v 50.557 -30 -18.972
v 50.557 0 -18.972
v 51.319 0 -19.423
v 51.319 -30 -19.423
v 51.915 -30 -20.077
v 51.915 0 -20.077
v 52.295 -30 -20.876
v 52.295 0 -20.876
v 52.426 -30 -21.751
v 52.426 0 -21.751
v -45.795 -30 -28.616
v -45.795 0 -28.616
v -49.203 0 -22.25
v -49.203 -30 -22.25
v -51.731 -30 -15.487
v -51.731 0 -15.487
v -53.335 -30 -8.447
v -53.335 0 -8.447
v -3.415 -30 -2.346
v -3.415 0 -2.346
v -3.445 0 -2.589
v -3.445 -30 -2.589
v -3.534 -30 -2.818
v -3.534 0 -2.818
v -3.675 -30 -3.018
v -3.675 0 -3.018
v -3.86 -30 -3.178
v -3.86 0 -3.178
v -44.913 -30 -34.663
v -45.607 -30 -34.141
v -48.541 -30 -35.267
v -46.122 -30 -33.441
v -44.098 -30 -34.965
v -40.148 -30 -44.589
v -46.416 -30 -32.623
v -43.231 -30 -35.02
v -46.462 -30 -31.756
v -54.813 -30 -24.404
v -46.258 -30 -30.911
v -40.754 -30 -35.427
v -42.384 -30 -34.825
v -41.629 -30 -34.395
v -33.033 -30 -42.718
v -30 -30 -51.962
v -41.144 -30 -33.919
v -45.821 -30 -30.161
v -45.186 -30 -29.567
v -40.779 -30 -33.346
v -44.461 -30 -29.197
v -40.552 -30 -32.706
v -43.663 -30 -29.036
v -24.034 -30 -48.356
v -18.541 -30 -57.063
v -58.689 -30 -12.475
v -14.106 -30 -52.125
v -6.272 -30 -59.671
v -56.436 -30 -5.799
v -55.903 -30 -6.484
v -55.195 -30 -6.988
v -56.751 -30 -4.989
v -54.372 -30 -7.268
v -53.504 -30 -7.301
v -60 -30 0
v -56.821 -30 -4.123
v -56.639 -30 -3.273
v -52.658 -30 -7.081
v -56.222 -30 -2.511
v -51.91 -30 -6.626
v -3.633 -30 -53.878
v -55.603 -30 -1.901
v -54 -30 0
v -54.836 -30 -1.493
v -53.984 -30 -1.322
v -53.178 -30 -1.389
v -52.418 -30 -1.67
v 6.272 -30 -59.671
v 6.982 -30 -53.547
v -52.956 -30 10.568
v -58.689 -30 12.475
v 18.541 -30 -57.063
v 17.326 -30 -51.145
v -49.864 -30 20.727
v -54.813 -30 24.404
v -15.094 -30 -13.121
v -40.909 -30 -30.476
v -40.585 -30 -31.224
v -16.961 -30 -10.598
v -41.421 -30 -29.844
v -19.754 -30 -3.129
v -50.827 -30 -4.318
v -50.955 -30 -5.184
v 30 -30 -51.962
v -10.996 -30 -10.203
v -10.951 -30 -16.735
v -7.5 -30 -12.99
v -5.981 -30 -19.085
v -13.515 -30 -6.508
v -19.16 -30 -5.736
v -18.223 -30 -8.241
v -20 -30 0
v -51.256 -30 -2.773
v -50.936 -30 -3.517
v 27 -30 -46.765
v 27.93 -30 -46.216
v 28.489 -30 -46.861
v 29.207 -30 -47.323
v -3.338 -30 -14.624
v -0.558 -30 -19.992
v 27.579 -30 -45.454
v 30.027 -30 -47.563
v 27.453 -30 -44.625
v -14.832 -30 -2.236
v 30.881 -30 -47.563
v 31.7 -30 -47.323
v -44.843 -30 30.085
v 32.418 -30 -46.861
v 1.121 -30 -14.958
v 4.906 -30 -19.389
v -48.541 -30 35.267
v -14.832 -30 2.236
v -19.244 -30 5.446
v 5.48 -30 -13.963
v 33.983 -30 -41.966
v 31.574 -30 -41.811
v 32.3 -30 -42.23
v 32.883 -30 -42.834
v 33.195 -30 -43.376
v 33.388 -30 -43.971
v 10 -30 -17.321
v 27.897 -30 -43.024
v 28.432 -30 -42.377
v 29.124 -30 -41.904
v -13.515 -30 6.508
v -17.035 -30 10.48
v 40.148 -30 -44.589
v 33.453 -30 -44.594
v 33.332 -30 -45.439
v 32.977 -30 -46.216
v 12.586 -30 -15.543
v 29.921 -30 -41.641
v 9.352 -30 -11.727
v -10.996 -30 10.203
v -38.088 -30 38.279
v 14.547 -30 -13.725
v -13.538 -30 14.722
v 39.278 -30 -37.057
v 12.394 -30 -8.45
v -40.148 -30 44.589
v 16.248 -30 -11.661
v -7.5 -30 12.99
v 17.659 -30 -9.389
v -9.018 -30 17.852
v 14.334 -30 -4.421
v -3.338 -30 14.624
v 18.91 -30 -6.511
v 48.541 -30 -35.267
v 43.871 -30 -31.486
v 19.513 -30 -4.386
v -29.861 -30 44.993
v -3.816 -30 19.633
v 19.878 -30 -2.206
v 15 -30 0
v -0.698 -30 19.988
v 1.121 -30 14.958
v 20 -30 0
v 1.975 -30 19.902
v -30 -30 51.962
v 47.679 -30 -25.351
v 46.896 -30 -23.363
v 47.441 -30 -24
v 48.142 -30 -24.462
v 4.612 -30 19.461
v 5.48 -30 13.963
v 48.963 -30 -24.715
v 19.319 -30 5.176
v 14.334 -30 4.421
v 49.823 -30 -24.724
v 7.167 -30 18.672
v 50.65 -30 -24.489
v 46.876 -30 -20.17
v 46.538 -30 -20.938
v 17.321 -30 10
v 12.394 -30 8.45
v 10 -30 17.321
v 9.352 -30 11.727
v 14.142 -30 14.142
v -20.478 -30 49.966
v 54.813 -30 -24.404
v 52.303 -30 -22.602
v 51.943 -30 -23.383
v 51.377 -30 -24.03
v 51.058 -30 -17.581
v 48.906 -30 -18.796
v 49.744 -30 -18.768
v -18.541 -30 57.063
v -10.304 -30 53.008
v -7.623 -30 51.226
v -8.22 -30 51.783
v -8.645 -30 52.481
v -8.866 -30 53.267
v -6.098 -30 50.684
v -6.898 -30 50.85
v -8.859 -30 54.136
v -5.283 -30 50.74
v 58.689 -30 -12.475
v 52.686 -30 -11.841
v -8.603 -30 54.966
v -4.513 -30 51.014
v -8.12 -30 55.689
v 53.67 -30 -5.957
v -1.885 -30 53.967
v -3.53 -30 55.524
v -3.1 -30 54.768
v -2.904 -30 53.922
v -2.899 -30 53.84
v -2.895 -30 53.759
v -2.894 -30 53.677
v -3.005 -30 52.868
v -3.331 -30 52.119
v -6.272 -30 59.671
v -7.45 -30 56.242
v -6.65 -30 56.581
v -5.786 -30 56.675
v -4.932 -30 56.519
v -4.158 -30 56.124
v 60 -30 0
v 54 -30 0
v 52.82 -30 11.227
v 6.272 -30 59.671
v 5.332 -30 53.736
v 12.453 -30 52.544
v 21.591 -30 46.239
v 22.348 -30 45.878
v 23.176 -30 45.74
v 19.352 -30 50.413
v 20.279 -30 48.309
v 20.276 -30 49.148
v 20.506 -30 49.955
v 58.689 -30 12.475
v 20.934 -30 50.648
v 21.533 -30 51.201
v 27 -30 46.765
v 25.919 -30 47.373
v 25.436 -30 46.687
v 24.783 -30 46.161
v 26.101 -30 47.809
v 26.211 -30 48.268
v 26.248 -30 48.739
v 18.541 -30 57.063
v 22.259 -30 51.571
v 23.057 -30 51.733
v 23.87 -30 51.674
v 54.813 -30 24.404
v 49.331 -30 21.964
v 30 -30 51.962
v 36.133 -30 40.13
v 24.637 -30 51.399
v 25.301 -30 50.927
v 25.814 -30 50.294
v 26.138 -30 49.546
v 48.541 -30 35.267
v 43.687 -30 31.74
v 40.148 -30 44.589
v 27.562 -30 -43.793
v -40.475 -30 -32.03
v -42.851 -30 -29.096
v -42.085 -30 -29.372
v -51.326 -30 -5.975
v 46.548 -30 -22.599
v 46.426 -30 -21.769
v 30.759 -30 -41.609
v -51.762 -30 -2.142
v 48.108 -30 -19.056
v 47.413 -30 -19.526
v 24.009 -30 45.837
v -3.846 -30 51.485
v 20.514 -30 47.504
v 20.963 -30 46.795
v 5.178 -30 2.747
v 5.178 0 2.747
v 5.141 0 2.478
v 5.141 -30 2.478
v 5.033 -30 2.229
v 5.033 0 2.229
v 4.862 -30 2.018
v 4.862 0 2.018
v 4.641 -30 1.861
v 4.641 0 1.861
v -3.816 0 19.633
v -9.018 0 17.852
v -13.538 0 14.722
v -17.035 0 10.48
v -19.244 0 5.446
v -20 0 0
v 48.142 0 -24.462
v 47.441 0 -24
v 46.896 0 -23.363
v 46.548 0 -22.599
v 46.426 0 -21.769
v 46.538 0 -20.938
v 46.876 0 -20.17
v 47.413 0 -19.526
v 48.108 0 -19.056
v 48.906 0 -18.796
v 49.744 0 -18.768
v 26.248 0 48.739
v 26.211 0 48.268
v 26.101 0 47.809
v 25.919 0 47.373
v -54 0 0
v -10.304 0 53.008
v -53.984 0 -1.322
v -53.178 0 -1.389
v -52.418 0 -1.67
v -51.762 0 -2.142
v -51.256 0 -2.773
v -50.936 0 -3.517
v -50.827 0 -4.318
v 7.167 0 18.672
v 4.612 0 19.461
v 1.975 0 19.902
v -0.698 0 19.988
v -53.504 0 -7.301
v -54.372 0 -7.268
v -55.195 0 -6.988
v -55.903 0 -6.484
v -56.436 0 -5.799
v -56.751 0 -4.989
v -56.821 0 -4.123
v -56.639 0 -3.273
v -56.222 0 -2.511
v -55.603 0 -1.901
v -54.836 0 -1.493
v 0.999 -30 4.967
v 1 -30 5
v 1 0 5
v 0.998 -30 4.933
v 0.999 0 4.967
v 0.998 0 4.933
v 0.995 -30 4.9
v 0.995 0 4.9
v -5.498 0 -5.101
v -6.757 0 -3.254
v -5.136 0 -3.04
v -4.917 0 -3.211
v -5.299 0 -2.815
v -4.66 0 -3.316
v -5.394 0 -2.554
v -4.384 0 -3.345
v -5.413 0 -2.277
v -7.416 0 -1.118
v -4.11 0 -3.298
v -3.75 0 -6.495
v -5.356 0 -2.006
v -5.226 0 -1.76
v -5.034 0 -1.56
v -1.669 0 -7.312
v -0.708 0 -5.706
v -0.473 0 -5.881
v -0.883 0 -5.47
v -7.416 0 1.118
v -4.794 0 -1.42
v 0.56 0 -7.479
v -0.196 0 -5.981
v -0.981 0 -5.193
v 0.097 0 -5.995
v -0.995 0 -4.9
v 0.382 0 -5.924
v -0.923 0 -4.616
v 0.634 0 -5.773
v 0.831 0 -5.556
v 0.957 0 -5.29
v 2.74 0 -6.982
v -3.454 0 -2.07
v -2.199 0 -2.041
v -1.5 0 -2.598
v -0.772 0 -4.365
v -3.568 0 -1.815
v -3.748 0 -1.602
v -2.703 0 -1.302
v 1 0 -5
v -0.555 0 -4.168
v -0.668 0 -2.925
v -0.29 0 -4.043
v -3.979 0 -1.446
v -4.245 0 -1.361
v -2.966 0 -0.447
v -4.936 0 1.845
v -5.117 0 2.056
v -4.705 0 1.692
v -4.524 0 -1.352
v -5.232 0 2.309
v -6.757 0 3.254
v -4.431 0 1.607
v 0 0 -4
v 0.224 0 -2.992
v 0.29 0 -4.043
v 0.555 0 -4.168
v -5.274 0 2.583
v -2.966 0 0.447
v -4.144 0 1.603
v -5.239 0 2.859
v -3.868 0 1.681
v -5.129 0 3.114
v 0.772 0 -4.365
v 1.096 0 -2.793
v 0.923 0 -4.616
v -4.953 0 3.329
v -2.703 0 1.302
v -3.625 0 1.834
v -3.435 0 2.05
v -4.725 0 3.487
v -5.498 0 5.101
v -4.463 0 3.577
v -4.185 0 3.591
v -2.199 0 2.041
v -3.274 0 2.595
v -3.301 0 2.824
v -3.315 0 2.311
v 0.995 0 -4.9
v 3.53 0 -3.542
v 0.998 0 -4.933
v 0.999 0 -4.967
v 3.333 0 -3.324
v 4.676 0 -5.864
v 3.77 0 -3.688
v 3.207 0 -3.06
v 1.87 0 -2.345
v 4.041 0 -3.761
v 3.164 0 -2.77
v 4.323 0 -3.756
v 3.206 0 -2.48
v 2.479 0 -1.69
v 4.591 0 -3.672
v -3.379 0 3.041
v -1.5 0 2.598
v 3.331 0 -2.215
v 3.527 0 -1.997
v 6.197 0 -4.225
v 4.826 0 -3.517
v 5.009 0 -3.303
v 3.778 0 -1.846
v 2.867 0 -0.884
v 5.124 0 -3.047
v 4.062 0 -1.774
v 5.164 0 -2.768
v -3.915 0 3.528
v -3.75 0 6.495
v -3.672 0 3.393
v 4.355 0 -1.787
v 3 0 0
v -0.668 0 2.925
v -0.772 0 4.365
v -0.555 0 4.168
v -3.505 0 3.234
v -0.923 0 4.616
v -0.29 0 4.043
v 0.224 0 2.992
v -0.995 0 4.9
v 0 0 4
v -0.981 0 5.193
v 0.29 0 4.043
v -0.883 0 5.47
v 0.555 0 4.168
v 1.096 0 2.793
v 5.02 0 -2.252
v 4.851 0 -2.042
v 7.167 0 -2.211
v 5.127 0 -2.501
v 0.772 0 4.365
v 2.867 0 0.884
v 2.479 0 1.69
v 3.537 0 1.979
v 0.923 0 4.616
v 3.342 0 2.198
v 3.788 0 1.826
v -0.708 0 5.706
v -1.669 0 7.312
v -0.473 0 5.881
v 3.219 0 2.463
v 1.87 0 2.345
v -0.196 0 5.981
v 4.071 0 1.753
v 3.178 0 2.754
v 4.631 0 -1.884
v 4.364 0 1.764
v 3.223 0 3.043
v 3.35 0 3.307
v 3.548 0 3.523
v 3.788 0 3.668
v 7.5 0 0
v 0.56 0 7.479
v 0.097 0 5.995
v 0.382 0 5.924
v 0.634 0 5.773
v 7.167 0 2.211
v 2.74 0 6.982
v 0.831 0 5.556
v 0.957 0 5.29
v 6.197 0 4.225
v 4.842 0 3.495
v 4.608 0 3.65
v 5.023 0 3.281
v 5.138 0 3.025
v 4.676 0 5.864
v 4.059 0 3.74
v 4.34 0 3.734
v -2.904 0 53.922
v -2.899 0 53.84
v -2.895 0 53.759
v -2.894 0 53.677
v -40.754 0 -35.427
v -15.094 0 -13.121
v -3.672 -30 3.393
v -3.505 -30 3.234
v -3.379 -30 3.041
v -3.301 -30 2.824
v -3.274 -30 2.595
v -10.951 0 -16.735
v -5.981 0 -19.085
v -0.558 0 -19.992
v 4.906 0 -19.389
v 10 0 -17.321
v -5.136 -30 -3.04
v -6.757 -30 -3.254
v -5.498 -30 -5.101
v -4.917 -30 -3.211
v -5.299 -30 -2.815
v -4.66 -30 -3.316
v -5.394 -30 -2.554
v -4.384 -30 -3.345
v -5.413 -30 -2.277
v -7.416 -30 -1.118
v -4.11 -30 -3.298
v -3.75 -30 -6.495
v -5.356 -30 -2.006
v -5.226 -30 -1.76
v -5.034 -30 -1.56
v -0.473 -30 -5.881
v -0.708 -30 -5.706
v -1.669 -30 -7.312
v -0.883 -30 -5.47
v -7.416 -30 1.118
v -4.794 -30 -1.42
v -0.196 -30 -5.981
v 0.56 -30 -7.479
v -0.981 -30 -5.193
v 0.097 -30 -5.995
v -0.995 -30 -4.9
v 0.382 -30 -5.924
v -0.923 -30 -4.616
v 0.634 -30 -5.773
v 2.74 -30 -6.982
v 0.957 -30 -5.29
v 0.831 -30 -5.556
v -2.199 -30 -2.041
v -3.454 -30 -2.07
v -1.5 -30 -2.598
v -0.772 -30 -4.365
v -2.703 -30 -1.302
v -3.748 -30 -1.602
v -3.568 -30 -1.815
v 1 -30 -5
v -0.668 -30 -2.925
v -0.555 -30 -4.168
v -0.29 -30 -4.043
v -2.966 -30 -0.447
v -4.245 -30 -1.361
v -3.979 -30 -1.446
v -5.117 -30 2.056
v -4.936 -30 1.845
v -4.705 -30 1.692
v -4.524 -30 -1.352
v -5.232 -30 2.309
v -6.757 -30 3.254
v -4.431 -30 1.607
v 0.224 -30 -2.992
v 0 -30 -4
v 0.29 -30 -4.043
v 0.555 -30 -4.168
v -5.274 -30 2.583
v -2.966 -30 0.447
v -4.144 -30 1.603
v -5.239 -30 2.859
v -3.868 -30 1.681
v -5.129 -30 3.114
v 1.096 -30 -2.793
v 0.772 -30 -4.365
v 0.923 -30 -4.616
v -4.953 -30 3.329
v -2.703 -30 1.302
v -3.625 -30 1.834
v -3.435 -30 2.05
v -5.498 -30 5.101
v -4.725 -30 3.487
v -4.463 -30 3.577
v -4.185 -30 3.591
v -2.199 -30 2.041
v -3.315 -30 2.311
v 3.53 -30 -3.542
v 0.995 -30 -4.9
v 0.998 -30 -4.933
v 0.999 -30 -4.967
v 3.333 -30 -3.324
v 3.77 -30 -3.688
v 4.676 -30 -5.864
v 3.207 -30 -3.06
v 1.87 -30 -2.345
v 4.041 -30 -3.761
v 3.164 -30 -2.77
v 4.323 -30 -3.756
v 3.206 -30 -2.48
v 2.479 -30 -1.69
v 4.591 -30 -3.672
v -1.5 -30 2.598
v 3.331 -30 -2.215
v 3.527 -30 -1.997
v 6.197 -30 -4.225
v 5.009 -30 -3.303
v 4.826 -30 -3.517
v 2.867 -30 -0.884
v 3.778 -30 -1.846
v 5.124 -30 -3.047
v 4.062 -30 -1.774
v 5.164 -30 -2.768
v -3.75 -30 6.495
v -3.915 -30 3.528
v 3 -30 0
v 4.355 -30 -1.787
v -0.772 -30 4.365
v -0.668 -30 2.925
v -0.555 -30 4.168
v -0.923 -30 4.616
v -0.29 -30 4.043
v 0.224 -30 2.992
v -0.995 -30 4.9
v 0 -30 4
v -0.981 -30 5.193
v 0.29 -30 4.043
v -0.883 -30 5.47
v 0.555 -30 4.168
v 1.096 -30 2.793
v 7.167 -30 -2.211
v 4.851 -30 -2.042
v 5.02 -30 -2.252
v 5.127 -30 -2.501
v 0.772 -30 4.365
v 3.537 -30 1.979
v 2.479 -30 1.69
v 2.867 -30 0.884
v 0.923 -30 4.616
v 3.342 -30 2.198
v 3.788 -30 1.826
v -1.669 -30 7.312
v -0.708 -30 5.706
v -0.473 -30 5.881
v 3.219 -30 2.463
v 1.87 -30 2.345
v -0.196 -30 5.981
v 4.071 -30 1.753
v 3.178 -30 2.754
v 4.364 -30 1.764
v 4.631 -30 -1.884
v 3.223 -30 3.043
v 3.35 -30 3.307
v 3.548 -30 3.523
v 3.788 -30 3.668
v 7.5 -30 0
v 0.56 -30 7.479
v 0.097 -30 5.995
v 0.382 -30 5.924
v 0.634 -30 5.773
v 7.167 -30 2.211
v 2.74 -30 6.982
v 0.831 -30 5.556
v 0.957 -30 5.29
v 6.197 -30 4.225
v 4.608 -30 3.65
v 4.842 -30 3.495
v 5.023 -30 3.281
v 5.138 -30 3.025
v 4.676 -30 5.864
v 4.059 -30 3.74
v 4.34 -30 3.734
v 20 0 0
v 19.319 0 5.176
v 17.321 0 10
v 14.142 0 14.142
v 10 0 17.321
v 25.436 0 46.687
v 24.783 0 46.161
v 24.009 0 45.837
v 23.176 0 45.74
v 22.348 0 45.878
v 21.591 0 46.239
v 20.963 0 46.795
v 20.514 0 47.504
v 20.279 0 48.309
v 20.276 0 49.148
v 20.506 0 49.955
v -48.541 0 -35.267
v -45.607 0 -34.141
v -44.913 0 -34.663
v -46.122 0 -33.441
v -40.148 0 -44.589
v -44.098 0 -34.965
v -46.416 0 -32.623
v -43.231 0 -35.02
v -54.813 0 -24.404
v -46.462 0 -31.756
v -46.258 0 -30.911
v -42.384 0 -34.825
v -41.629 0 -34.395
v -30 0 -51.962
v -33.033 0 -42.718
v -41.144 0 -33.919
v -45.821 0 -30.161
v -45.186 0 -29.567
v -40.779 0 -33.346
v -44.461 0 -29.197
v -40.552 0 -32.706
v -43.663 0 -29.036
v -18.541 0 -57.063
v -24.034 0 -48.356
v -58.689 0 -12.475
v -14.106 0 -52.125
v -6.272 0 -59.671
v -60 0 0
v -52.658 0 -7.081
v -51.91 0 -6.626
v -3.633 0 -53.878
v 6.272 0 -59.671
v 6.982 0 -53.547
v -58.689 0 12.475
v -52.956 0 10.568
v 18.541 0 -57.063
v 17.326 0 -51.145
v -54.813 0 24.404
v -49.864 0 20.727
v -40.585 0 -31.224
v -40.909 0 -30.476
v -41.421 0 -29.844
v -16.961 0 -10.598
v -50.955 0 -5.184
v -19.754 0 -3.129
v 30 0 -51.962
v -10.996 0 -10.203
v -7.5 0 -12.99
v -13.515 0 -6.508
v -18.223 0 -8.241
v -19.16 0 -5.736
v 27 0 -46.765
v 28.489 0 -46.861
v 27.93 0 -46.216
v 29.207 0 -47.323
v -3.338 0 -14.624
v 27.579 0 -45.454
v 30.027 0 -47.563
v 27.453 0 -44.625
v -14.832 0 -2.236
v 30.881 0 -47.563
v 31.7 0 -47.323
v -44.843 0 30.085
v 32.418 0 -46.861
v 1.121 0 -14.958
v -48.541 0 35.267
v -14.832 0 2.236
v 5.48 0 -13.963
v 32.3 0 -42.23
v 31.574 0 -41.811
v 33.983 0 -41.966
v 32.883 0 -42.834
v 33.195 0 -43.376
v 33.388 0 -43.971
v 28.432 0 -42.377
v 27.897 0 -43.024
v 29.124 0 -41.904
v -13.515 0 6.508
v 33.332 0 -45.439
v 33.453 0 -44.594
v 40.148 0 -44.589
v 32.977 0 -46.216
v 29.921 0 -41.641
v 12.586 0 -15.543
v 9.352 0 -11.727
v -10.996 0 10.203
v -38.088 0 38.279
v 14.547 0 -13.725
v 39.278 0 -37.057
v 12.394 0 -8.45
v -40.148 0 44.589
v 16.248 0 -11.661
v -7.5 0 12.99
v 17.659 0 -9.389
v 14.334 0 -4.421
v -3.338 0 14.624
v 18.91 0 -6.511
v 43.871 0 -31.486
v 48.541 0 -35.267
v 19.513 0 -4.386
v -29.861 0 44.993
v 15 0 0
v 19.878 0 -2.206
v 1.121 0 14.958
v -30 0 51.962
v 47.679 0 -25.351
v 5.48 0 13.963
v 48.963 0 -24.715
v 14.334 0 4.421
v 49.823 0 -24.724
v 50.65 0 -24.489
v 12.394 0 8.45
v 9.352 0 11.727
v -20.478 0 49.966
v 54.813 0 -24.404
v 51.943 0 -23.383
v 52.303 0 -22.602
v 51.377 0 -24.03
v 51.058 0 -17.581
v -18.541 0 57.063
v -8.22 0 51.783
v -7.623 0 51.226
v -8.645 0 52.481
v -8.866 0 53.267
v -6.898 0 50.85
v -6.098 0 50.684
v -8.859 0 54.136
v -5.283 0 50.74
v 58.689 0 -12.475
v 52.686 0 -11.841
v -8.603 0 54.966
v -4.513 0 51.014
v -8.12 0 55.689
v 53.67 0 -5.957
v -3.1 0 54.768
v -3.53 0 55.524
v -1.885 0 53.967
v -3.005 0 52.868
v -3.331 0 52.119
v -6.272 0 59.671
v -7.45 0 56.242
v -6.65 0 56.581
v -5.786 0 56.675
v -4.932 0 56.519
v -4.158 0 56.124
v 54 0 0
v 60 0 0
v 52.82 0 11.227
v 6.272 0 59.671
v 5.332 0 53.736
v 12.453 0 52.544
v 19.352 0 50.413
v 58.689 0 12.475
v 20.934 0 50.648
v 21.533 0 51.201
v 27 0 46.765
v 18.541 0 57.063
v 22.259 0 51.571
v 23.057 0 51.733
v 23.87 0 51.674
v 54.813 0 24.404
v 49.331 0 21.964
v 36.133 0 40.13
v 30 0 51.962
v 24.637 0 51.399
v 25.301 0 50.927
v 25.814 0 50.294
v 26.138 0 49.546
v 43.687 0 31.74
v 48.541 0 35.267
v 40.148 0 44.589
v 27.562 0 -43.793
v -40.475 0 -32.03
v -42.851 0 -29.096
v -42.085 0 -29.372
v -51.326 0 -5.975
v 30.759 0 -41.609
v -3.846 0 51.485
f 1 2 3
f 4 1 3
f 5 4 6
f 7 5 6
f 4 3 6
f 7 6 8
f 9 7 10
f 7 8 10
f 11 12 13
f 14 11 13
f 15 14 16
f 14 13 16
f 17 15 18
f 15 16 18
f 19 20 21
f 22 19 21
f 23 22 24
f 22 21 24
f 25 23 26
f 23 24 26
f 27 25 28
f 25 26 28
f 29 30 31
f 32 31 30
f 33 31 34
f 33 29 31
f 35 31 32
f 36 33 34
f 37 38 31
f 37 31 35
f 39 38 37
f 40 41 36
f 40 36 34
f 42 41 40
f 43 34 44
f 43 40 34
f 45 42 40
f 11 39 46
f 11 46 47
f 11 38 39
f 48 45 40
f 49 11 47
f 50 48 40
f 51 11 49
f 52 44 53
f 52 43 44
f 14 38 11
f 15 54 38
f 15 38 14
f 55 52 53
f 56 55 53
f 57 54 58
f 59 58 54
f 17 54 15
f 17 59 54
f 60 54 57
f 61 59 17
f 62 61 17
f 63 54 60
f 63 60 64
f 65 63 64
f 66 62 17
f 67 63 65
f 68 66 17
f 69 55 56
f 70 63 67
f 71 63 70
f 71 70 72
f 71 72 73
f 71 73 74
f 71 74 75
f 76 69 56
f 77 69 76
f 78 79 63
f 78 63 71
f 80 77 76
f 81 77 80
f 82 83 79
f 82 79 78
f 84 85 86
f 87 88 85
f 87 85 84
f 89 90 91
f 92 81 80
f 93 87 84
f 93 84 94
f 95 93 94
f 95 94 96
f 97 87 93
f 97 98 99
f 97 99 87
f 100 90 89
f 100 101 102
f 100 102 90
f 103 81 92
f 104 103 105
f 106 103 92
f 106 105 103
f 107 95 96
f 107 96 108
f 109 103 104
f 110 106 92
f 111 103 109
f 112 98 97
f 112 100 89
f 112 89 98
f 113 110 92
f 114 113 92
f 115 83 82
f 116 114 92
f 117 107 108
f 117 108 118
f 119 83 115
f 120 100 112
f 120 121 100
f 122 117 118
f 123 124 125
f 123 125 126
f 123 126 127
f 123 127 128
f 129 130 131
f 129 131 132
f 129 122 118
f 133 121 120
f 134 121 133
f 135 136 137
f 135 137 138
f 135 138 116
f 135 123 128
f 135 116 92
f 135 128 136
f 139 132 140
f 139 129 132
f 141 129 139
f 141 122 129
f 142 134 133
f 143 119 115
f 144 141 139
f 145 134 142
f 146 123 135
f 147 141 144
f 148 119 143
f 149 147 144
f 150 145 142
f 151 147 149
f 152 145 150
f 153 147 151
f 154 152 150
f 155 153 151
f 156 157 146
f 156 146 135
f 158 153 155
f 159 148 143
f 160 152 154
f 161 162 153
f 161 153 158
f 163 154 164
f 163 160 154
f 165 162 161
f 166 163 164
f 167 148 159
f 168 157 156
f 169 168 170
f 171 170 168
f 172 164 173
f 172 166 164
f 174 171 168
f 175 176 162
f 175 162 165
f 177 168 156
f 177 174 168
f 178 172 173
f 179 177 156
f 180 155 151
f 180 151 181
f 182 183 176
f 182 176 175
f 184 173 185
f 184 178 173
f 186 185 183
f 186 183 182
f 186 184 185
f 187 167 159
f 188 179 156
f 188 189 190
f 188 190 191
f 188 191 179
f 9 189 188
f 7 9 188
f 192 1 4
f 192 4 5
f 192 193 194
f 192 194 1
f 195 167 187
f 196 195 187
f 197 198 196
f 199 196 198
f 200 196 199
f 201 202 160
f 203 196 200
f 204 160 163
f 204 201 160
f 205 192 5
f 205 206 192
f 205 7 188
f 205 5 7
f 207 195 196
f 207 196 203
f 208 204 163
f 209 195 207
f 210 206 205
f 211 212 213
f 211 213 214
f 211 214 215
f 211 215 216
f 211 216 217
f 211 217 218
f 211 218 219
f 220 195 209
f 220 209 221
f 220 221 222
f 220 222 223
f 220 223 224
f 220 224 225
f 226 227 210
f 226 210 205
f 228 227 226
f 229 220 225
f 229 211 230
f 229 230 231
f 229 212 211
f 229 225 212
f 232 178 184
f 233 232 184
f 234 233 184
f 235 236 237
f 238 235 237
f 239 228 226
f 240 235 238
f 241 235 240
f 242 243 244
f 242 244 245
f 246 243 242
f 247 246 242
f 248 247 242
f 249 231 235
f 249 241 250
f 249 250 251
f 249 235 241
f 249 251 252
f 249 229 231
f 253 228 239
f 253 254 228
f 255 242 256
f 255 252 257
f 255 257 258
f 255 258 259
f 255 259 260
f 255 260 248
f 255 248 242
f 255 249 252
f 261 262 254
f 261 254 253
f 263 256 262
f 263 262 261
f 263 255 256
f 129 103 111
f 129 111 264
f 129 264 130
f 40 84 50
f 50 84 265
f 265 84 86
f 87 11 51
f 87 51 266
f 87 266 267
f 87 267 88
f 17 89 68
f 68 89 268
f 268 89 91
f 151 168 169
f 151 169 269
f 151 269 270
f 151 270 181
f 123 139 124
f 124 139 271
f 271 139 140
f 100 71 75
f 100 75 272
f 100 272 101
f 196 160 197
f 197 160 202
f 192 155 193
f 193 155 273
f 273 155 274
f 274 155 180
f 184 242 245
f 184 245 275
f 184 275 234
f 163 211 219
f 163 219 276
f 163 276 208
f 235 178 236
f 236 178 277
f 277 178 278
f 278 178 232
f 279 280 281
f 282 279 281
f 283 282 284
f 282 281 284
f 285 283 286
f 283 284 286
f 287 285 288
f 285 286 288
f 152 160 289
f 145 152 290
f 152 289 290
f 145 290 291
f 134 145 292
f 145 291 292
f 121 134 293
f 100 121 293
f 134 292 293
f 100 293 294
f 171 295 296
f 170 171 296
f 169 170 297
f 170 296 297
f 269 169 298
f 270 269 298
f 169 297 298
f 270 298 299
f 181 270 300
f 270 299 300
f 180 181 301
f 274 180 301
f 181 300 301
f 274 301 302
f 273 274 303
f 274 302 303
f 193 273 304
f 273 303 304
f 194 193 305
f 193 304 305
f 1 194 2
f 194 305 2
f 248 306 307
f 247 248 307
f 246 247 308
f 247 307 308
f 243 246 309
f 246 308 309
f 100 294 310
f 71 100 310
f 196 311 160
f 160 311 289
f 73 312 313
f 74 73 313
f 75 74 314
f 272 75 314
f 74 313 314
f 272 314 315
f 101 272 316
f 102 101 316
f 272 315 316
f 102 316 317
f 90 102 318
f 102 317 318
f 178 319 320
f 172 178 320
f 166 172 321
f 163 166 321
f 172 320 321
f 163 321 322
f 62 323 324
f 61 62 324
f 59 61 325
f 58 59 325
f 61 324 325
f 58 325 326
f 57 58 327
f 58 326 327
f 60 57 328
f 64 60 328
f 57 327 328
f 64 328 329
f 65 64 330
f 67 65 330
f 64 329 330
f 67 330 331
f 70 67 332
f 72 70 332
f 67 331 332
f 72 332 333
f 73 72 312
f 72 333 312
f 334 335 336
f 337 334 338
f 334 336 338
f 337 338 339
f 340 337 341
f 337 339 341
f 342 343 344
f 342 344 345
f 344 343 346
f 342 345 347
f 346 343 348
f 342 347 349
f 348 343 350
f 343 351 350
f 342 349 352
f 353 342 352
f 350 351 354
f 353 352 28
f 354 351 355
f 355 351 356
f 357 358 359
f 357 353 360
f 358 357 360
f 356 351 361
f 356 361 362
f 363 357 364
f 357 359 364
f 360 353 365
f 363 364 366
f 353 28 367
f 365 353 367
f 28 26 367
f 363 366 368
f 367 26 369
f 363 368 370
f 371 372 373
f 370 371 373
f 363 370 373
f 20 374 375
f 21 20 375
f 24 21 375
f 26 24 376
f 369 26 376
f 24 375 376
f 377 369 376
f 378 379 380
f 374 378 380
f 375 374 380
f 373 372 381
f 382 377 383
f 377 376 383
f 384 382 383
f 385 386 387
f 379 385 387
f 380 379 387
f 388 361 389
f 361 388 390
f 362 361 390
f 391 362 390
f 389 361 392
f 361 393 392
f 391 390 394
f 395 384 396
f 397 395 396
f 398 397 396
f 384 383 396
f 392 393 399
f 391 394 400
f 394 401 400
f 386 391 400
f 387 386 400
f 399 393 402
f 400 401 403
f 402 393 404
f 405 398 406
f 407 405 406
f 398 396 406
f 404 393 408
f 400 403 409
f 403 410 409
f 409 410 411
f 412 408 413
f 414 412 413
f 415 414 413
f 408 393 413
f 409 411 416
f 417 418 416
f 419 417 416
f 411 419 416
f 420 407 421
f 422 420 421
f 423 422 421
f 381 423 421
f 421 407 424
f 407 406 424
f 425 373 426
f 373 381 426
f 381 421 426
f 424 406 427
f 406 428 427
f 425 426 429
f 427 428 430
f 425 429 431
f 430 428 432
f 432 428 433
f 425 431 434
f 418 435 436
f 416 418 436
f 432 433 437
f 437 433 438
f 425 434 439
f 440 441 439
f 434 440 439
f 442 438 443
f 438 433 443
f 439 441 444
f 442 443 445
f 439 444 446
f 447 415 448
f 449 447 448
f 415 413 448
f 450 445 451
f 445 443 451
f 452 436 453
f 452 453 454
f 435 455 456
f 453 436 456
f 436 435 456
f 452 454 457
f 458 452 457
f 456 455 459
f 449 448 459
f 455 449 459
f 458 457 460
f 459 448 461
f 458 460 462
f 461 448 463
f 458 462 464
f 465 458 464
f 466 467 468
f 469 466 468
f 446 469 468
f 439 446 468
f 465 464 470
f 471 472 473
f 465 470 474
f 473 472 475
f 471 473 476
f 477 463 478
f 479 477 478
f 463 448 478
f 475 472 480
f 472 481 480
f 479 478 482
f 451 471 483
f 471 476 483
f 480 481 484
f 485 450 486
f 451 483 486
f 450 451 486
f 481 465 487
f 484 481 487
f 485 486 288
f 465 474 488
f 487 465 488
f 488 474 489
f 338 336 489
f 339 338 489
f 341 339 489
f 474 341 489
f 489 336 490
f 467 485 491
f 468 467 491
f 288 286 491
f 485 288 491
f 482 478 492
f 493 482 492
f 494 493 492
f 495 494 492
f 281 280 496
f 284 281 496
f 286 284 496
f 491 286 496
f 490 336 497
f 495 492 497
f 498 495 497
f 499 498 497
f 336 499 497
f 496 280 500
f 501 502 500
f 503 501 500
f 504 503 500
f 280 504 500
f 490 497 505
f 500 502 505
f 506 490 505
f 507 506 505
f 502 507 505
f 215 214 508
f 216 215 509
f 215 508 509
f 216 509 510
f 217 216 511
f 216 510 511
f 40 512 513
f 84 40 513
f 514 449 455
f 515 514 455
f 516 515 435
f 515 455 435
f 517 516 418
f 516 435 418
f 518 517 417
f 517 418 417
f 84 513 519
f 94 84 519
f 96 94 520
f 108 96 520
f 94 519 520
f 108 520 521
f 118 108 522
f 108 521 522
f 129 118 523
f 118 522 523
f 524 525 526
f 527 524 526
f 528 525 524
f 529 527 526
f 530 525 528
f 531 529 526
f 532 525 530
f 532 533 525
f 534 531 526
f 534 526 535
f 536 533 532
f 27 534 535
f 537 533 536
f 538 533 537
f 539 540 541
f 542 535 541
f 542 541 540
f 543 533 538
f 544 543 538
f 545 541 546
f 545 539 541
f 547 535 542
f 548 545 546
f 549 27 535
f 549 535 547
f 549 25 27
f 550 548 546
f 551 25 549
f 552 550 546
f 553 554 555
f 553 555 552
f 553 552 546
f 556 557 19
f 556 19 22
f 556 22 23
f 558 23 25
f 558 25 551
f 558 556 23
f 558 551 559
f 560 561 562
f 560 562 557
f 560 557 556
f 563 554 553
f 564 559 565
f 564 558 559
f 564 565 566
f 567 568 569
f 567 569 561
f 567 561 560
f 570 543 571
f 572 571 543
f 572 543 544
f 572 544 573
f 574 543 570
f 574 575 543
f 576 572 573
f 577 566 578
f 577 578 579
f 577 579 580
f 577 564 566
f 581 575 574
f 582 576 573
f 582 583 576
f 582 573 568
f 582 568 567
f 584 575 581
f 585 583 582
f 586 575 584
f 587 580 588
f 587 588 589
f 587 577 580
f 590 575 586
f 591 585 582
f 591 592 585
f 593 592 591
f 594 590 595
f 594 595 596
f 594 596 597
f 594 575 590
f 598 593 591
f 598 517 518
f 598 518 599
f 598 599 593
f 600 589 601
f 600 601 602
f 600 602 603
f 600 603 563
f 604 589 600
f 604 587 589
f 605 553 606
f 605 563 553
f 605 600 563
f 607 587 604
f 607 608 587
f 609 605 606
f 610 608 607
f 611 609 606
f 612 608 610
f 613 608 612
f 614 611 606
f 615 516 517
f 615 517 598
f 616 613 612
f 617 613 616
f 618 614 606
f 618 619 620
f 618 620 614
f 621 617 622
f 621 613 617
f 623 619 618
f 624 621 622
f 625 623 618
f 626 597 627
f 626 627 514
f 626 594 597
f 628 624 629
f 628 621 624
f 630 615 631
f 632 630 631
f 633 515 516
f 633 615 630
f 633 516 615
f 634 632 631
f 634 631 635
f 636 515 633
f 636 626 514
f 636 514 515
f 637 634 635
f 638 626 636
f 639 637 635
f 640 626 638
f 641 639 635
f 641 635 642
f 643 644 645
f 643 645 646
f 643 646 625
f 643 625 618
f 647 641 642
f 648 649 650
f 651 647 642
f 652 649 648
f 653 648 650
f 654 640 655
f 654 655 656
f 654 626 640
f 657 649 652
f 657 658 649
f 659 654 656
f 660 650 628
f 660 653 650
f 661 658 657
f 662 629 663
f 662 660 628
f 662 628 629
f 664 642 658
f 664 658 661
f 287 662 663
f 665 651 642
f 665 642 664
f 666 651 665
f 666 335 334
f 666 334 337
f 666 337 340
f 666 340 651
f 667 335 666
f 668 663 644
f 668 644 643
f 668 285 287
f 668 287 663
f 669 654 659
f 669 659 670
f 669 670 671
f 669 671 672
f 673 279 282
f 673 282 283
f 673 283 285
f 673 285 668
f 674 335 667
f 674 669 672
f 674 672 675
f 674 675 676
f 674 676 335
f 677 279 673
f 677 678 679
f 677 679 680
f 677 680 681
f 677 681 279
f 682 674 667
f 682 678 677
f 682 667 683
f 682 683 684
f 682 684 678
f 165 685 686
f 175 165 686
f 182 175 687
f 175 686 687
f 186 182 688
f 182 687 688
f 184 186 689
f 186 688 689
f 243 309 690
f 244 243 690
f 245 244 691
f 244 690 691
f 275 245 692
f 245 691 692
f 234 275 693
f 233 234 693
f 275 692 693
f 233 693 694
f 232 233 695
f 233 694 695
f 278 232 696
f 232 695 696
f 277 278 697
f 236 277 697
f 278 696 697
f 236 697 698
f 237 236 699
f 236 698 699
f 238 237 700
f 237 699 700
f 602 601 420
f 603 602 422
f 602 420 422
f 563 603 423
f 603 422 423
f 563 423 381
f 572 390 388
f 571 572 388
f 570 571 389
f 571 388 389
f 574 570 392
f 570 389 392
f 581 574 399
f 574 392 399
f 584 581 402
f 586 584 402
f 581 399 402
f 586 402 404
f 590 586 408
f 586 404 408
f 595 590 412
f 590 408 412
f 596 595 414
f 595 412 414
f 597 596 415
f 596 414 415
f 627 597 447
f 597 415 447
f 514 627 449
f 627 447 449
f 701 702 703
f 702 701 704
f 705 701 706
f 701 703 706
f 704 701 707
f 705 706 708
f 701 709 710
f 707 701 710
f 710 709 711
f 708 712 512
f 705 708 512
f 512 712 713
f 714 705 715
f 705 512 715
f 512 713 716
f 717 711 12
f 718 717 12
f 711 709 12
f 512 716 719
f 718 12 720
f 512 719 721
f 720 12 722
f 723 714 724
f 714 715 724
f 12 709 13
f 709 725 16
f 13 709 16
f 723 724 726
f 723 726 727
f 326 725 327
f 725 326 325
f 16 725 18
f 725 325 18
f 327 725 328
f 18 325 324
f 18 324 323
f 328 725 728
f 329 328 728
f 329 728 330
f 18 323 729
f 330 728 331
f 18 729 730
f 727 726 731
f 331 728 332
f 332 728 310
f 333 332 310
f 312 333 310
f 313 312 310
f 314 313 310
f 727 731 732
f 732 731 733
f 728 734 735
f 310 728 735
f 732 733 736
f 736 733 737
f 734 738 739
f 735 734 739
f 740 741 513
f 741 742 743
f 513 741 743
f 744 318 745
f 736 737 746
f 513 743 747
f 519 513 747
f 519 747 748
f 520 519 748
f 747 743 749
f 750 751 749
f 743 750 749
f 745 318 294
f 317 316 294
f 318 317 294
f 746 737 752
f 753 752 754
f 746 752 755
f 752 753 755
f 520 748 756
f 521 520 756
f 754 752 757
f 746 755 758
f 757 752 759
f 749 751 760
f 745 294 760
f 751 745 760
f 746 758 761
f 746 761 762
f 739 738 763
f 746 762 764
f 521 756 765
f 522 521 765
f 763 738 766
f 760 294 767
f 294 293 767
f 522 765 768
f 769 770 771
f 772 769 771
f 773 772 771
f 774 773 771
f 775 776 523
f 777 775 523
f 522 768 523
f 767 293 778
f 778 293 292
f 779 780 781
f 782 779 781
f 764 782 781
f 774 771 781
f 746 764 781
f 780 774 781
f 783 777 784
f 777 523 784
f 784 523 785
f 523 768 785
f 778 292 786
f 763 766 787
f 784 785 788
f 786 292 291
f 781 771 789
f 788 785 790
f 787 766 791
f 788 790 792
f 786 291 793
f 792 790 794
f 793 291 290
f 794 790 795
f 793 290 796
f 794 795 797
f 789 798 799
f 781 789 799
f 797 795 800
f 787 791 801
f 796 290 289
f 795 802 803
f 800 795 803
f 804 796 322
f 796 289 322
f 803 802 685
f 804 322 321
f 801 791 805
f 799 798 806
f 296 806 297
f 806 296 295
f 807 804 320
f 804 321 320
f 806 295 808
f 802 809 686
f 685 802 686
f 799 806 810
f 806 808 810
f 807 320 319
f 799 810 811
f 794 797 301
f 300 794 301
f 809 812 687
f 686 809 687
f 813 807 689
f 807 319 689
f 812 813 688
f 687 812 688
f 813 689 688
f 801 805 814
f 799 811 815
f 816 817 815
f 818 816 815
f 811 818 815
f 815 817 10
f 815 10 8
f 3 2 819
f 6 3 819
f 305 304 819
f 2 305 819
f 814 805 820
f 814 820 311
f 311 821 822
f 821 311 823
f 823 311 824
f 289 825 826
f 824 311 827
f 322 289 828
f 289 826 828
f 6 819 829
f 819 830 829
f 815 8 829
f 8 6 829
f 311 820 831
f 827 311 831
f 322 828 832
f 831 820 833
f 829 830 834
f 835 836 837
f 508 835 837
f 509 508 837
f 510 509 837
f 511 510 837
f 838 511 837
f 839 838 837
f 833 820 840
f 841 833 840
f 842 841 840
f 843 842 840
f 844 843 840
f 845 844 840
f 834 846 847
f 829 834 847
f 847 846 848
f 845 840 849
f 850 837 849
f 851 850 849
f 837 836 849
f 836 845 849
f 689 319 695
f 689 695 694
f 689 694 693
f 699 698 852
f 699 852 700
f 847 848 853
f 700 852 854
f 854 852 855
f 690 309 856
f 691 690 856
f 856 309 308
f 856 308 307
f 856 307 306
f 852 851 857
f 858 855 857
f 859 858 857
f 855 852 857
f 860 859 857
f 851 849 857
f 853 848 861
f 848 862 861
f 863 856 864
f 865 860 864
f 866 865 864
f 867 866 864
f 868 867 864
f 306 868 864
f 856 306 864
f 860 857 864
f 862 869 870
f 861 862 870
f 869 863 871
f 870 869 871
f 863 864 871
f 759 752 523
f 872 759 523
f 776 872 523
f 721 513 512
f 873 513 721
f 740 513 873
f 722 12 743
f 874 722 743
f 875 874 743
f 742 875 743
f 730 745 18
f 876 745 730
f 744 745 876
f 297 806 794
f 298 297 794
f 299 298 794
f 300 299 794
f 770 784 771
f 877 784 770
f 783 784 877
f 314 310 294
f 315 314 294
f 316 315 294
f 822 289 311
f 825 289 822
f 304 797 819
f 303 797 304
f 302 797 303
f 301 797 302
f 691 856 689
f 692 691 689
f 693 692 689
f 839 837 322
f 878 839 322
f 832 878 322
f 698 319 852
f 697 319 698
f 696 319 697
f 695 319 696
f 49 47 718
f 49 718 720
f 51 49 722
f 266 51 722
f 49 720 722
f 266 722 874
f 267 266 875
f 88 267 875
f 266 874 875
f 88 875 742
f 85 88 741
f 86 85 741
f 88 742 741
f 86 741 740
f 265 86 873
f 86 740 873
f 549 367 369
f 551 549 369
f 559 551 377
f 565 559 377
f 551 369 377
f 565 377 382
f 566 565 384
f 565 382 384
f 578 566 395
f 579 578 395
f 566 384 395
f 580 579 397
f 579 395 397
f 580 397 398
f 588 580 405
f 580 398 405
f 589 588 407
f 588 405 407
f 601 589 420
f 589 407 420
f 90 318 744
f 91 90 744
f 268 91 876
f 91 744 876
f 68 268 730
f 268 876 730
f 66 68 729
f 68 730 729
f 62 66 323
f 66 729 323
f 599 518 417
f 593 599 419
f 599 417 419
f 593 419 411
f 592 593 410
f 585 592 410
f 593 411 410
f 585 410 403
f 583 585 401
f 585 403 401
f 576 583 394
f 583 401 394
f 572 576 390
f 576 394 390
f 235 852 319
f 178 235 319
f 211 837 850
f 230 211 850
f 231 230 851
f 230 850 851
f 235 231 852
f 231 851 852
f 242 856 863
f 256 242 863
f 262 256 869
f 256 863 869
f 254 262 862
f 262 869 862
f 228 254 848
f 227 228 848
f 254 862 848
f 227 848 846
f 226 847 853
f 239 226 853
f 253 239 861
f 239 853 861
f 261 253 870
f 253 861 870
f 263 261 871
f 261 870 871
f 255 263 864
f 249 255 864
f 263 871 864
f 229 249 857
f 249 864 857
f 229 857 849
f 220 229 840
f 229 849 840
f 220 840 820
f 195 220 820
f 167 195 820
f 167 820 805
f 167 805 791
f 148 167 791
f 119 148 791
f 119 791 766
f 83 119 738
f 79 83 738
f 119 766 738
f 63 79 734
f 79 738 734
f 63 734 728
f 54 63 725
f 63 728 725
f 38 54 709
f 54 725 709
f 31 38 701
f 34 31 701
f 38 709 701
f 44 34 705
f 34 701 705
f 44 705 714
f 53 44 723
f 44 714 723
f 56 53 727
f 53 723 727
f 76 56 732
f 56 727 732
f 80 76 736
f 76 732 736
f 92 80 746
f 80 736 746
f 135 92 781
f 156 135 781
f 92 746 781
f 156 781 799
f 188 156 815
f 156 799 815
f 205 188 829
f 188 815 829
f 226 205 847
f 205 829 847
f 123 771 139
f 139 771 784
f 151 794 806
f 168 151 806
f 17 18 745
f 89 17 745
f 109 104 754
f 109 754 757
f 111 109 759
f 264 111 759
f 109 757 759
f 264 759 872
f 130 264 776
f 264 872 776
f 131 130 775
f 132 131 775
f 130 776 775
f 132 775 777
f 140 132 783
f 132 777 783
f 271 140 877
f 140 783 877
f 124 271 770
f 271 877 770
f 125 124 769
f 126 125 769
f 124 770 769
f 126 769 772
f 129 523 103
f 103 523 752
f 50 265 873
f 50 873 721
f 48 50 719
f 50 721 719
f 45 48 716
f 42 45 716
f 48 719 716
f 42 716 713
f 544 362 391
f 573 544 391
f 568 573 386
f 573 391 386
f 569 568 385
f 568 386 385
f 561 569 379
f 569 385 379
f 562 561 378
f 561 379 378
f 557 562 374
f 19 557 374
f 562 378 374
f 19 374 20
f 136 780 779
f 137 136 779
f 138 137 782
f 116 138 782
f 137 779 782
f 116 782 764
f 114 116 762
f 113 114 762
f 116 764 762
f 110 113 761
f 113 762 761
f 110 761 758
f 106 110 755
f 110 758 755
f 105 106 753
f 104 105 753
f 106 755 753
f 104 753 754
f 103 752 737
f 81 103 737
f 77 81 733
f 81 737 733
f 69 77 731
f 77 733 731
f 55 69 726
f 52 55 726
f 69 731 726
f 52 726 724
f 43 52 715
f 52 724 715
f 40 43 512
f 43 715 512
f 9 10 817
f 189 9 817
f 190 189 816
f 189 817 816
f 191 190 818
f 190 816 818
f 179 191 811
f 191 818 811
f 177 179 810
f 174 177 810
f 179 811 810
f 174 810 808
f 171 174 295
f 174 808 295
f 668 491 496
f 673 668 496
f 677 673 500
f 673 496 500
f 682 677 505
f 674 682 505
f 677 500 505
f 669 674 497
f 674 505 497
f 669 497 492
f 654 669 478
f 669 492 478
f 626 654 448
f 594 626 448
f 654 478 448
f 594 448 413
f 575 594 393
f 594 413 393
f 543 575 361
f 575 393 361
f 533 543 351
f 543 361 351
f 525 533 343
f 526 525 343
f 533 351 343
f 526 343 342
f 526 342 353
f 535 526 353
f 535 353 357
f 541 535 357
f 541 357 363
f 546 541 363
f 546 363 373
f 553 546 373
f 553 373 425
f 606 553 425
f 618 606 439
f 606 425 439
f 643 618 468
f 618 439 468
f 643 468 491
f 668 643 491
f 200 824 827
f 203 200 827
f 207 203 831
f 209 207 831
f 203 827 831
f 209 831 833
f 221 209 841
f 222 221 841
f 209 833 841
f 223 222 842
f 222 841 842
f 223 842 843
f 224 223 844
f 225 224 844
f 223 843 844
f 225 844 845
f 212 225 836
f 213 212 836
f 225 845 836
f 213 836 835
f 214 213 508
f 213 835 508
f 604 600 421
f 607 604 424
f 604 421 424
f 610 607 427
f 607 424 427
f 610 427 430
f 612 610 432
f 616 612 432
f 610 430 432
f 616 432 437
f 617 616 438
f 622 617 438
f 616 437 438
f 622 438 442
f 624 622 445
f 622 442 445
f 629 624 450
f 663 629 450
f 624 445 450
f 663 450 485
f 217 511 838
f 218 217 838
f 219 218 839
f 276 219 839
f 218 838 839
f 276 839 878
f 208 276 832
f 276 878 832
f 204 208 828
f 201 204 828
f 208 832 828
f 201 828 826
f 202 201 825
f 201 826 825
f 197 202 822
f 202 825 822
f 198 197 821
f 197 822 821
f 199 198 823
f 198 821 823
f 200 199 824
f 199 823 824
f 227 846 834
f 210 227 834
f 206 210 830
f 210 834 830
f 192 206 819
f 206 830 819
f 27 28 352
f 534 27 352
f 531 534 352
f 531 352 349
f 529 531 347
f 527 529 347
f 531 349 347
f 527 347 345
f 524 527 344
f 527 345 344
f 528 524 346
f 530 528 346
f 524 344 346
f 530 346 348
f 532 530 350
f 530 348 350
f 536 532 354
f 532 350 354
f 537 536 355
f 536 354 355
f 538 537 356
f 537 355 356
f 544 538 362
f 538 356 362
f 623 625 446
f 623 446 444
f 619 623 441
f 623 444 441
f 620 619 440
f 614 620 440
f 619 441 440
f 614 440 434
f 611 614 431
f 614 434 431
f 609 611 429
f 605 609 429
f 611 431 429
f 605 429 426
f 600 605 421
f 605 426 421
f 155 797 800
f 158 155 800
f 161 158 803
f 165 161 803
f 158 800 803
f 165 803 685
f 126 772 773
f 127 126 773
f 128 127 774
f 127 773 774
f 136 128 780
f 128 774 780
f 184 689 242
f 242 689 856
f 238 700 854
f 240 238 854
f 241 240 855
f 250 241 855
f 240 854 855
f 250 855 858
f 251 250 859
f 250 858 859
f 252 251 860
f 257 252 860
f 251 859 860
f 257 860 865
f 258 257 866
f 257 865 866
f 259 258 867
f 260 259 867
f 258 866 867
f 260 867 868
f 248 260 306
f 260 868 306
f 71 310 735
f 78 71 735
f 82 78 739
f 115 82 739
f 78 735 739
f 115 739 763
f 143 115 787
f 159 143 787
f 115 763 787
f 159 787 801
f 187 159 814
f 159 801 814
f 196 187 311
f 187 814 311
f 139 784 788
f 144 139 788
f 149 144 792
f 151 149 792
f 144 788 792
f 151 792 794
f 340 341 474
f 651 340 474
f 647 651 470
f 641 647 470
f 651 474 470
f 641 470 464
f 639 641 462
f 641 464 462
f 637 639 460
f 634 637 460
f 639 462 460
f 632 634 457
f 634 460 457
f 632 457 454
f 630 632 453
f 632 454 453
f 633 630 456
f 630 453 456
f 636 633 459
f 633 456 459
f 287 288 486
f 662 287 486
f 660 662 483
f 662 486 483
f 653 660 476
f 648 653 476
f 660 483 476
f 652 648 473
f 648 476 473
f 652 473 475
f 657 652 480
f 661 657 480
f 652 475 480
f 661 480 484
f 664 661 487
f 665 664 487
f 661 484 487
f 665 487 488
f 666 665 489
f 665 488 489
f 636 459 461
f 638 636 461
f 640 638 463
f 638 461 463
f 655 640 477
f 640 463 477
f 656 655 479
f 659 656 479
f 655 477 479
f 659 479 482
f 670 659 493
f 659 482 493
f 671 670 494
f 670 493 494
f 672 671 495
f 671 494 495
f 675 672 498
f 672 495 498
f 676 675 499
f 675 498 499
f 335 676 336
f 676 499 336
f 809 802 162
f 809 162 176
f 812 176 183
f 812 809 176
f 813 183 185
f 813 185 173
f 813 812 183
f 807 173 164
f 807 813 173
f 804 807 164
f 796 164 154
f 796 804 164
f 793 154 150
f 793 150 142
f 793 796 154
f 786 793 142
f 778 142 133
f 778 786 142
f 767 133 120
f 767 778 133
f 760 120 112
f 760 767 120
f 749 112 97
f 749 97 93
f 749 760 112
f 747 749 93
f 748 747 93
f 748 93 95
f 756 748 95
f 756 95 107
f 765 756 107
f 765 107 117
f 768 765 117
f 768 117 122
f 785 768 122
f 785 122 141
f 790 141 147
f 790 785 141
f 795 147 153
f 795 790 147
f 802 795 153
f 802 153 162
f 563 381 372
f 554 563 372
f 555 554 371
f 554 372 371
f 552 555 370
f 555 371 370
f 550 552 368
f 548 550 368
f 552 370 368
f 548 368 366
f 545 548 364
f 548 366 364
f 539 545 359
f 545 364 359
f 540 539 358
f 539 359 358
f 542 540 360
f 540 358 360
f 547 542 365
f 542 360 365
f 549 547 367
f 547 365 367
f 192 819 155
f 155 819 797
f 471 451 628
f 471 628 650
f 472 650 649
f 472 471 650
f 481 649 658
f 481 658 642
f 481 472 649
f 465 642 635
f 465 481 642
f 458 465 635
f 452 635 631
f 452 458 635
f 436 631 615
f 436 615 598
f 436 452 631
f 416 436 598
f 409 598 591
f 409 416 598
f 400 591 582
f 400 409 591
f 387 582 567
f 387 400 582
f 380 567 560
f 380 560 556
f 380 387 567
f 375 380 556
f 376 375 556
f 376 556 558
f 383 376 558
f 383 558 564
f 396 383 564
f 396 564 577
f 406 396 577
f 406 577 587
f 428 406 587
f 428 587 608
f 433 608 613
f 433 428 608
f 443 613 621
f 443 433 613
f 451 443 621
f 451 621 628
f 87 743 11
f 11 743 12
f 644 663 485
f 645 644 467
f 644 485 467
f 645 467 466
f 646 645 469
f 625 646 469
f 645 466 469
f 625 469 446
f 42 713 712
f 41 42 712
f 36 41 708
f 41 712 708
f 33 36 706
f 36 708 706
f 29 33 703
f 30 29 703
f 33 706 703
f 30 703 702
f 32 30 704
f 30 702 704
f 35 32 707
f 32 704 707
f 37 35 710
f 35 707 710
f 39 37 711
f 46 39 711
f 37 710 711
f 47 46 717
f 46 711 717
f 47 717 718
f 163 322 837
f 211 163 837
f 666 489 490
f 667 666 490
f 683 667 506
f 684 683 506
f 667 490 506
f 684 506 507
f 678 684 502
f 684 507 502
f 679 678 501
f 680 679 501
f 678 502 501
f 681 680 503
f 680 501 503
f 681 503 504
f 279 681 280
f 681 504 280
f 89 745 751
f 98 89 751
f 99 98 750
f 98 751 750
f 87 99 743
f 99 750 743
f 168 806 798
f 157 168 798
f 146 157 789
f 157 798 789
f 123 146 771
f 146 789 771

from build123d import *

# Parameters (mm, degrees)
F0_R     = 60
F0_R_2   = 15
F0_R_3   = 7.5
F0_R_4   = 3
F1_DEPTH = 30


with BuildPart() as f1:
    # F0 (on Front) → F1 (new body)
    with BuildSketch(Plane.XZ):
        Circle(F0_R)
        with BuildLine():
            ThreePointArc((27, 46.765372), (46.765372, 27), (54, 0))
            ThreePointArc((54, 0), (53.259422, -8.912571), (51.058003, -17.58068))
            ThreePointArc((51.058003, -17.58068), (50.812483, -18.278171), (50.557436, -18.972234))
            ThreePointArc((50.557436, -18.972234), (51.915275, -20.076534), (52.425809, -21.750618))
            ThreePointArc((52.425809, -21.750618), (51.030096, -24.285626), (48.141633, -24.461871))
            ThreePointArc((48.141633, -24.461871), (47.912466, -24.907741), (47.67917, -25.351464))
            ThreePointArc((47.67917, -25.351464), (41.667728, -34.348224), (33.983301, -41.965882))
            ThreePointArc((33.983301, -41.965882), (33.435837, -42.403358), (32.882743, -42.833693))
            ThreePointArc((32.882743, -42.833693), (33.307073, -43.668619), (33.453266, -44.593706))
            ThreePointArc((33.453266, -44.593706), (31.298724, -47.472108), (27.929798, -46.216083))
            ThreePointArc((27.929798, -46.216083), (27.466272, -46.493052), (27, -46.765372))
            ThreePointArc((27, -46.765372), (-8.912571, -53.259422), (-40.754317, -35.427188))
            ThreePointArc((-40.754317, -35.427188), (-41.194818, -34.913994), (-41.628857, -34.395323))
            ThreePointArc((-41.628857, -34.395323), (-45.889992, -33.80989), (-45.186419, -29.566662))
            ThreePointArc((-45.186419, -29.566662), (-45.492993, -29.09274), (-45.794597, -28.61564))
            ThreePointArc((-45.794597, -28.61564), (-50.580298, -18.911199), (-53.33517, -8.447461))
            ThreePointArc((-53.33517, -8.447461), (-53.422748, -7.874641), (-53.504174, -7.300914))
            ThreePointArc((-53.504174, -7.300914), (-56.817448, -4.558248), (-53.983805, -1.322438))
            ThreePointArc((-53.983805, -1.322438), (-53.995951, -0.661269), (-54, 0))
            ThreePointArc((-54, 0), (-41.667728, 34.348224), (-10.303686, 53.007868))
            ThreePointArc((-10.303686, 53.007868), (-9.585714, 53.142394), (-8.865989, 53.267197))
            ThreePointArc((-8.865989, 53.267197), (-6.221613, 56.659435), (-2.904139, 53.921851))
            ThreePointArc((-2.904139, 53.921851), (-2.394463, 53.946886), (-1.884573, 53.967105))
            ThreePointArc((-1.884573, 53.967105), (8.912571, 53.259422), (19.351869, 50.413343))
            ThreePointArc((19.351869, 50.413343), (19.930144, 50.187542), (20.505785, 49.955108))
            ThreePointArc((20.505785, 49.955108), (23.869761, 51.674182), (26.248353, 48.739246))
            ThreePointArc((26.248353, 48.739246), (26.164896, 48.036552), (25.919167, 47.372954))
            ThreePointArc((25.919167, 47.372954), (26.461327, 47.072265), (27, 46.765372))
        make_face(mode=Mode.SUBTRACT)
        with BuildLine():
            ThreePointArc((-19.753767, -3.128689), (-19.938347, -1.569182), (-20, 0))
            Line((-20, 0), (-54, 0))
            ThreePointArc((-54, 0), (-53.995951, -0.661269), (-53.983805, -1.322438))
            ThreePointArc((-53.983805, -1.322438), (-51.761898, -2.142307), (-50.827056, -4.31834))
            ThreePointArc((-50.827056, -4.31834), (-51.594496, -6.322256), (-53.504174, -7.300914))
            ThreePointArc((-53.504174, -7.300914), (-53.422748, -7.874641), (-53.33517, -8.447461))
            Line((-53.33517, -8.447461), (-19.753767, -3.128689))
        make_face()
        with BuildLine():
            Line((-40.754317, -35.427188), (-15.094192, -13.121181))
            ThreePointArc((-15.094192, -13.121181), (-16.077137, -11.896456), (-16.960962, -10.598385))
            Line((-16.960962, -10.598385), (-45.794597, -28.61564))
            ThreePointArc((-45.794597, -28.61564), (-45.492993, -29.09274), (-45.186419, -29.566662))
            ThreePointArc((-45.186419, -29.566662), (-42.084598, -29.371939), (-40.474729, -32.030422))
            ThreePointArc((-40.474729, -32.030422), (-40.778656, -33.34617), (-41.628857, -34.395323))
            ThreePointArc((-41.628857, -34.395323), (-41.194818, -34.913994), (-40.754317, -35.427188))
        make_face()
        with BuildLine():
            Line((33.983301, -41.965882), (12.586408, -15.542919))
            ThreePointArc((12.586408, -15.542919), (11.328125, -16.482524), (10, -17.320508))
            Line((10, -17.320508), (27, -46.765372))
            ThreePointArc((27, -46.765372), (27.466272, -46.493052), (27.929798, -46.216083))
            ThreePointArc((27.929798, -46.216083), (28.761418, -42.116277), (32.882743, -42.833693))
            ThreePointArc((32.882743, -42.833693), (33.435837, -42.403358), (33.983301, -41.965882))
        make_face()
        with BuildLine():
            ThreePointArc((50.557436, -18.972234), (50.812483, -18.278171), (51.058003, -17.58068))
            Line((51.058003, -17.58068), (18.910372, -6.511363))
            ThreePointArc((18.910372, -6.511363), (18.341201, -7.974981), (17.658952, -9.389431))
            Line((17.658952, -9.389431), (47.67917, -25.351464))
            ThreePointArc((47.67917, -25.351464), (47.912466, -24.907741), (48.141633, -24.461871))
            ThreePointArc((48.141633, -24.461871), (46.679931, -20.542251), (50.557436, -18.972234))
        make_face()
        with BuildLine():
            Line((10, 17.320508), (27, 46.765372))
            ThreePointArc((27, 46.765372), (26.461327, 47.072265), (25.919167, 47.372954))
            ThreePointArc((25.919167, 47.372954), (21.956778, 46.03151), (20.505785, 49.955108))
            ThreePointArc((20.505785, 49.955108), (19.930144, 50.187542), (19.351869, 50.413343))
            Line((19.351869, 50.413343), (7.167359, 18.671609))
            ThreePointArc((7.167359, 18.671609), (8.610222, 18.051706), (10, 17.320508))
        make_face()
        with BuildLine():
            ThreePointArc((-3.81618, 19.632544), (-2.264064, 19.871437), (-0.69799, 19.987817))
            Line((-0.69799, 19.987817), (-1.884573, 53.967105))
            ThreePointArc((-1.884573, 53.967105), (-2.394463, 53.946886), (-2.904139, 53.921851))
            ThreePointArc((-2.904139, 53.921851), (-2.896656, 53.799707), (-2.89416, 53.677359))
            ThreePointArc((-2.89416, 53.677359), (-5.688595, 50.68441), (-8.865989, 53.267197))
            ThreePointArc((-8.865989, 53.267197), (-9.585714, 53.142394), (-10.303686, 53.007868))
            Line((-10.303686, 53.007868), (-3.81618, 19.632544))
        make_face()
        with BuildLine():
            ThreePointArc((20, 0), (17.320508, 10), (10, 17.320508))
            ThreePointArc((10, 17.320508), (8.610222, 18.051706), (7.167359, 18.671609))
            ThreePointArc((7.167359, 18.671609), (3.300952, 19.725712), (-0.69799, 19.987817))
            ThreePointArc((-0.69799, 19.987817), (-2.264064, 19.871437), (-3.81618, 19.632544))
            ThreePointArc((-3.81618, 19.632544), (-15.432492, 12.721564), (-20, 0))
            ThreePointArc((-20, 0), (-19.938347, -1.569182), (-19.753767, -3.128689))
            ThreePointArc((-19.753767, -3.128689), (-18.733444, -7.004148), (-16.960962, -10.598385))
            ThreePointArc((-16.960962, -10.598385), (-16.077137, -11.896456), (-15.094192, -13.121181))
            ThreePointArc((-15.094192, -13.121181), (-3.300952, -19.725712), (10, -17.320508))
            ThreePointArc((10, -17.320508), (11.328125, -16.482524), (12.586408, -15.542919))
            ThreePointArc((12.586408, -15.542919), (15.432492, -12.721564), (17.658952, -9.389431))
            ThreePointArc((17.658952, -9.389431), (18.341201, -7.974981), (18.910372, -6.511363))
            ThreePointArc((18.910372, -6.511363), (19.725712, -3.300952), (20, 0))
        make_face()
        Circle(F0_R_2, mode=Mode.SUBTRACT)
        Circle(F0_R_3)
        with BuildLine():
            ThreePointArc((4.640901, 1.860656), (4.909404, 0.947496), (5, 0))
            ThreePointArc((5, 0), (4.906961, -0.960072), (4.631305, -1.884413))
            ThreePointArc((4.631305, -1.884413), (5.020312, -2.252407), (5.163685, -2.768343))
            ThreePointArc((5.163685, -2.768343), (4.591373, -3.67227), (3.529518, -3.541539))
            ThreePointArc((3.529518, -3.541539), (2.362021, -4.40691), (0.994987, -4.9))
            ThreePointArc((0.994987, -4.9), (0.998746, -4.949937), (1, -5))
            ThreePointArc((1, -5), (-0.050063, -5.998746), (-0.994987, -4.9))
            ThreePointArc((-0.994987, -4.9), (-2.57588, -4.285422), (-3.860348, -3.17769))
            ThreePointArc((-3.860348, -3.17769), (-5.298592, -2.815124), (-4.794019, -1.420346))
            ThreePointArc((-4.794019, -1.420346), (-4.997953, 0.143075), (-4.704915, 1.692268))
            ThreePointArc((-4.704915, 1.692268), (-5.128872, 3.113627), (-3.672242, 3.393322))
            ThreePointArc((-3.672242, 3.393322), (-2.452199, 4.357376), (-0.994987, 4.9))
            ThreePointArc((-0.994987, 4.9), (-0.050063, 5.998746), (1, 5))
            ThreePointArc((1, 5), (0.998746, 4.949937), (0.994987, 4.9))
            ThreePointArc((0.994987, 4.9), (2.373304, 4.400844), (3.54762, 3.523406))
            ThreePointArc((3.54762, 3.523406), (4.607819, 3.649799), (5.177817, 2.746971))
            ThreePointArc((5.177817, 2.746971), (5.033119, 2.228841), (4.640901, 1.860656))
        make_face(mode=Mode.SUBTRACT)
        with BuildLine():
            ThreePointArc((4.631305, -1.884413), (4.906961, -0.960072), (5, 0))
            ThreePointArc((5, 0), (4.909404, 0.947496), (4.640901, 1.860656))
            ThreePointArc((4.640901, 1.860656), (3.342253, 2.197576), (3.54762, 3.523406))
            ThreePointArc((3.54762, 3.523406), (2.373304, 4.400844), (0.994987, 4.9))
            ThreePointArc((0.994987, 4.9), (0, 4), (-0.994987, 4.9))
            ThreePointArc((-0.994987, 4.9), (-2.452199, 4.357376), (-3.672242, 3.393322))
            ThreePointArc((-3.672242, 3.393322), (-3.379125, 3.040885), (-3.27406, 2.594689))
            ThreePointArc((-3.27406, 2.594689), (-3.740607, 1.748859), (-4.704915, 1.692268))
            ThreePointArc((-4.704915, 1.692268), (-4.997953, 0.143075), (-4.794019, -1.420346))
            ThreePointArc((-4.794019, -1.420346), (-3.858055, -1.515718), (-3.415493, -2.345936))
            ThreePointArc((-3.415493, -2.345936), (-3.533693, -2.817558), (-3.860348, -3.17769))
            ThreePointArc((-3.860348, -3.17769), (-2.57588, -4.285422), (-0.994987, -4.9))
            ThreePointArc((-0.994987, -4.9), (0, -4), (0.994987, -4.9))
            ThreePointArc((0.994987, -4.9), (2.362021, -4.40691), (3.529518, -3.541539))
            ThreePointArc((3.529518, -3.541539), (3.330948, -2.214675), (4.631305, -1.884413))
        make_face()
        Circle(F0_R_4, mode=Mode.SUBTRACT)
    extrude(amount=F1_DEPTH)


solid = f1.part
